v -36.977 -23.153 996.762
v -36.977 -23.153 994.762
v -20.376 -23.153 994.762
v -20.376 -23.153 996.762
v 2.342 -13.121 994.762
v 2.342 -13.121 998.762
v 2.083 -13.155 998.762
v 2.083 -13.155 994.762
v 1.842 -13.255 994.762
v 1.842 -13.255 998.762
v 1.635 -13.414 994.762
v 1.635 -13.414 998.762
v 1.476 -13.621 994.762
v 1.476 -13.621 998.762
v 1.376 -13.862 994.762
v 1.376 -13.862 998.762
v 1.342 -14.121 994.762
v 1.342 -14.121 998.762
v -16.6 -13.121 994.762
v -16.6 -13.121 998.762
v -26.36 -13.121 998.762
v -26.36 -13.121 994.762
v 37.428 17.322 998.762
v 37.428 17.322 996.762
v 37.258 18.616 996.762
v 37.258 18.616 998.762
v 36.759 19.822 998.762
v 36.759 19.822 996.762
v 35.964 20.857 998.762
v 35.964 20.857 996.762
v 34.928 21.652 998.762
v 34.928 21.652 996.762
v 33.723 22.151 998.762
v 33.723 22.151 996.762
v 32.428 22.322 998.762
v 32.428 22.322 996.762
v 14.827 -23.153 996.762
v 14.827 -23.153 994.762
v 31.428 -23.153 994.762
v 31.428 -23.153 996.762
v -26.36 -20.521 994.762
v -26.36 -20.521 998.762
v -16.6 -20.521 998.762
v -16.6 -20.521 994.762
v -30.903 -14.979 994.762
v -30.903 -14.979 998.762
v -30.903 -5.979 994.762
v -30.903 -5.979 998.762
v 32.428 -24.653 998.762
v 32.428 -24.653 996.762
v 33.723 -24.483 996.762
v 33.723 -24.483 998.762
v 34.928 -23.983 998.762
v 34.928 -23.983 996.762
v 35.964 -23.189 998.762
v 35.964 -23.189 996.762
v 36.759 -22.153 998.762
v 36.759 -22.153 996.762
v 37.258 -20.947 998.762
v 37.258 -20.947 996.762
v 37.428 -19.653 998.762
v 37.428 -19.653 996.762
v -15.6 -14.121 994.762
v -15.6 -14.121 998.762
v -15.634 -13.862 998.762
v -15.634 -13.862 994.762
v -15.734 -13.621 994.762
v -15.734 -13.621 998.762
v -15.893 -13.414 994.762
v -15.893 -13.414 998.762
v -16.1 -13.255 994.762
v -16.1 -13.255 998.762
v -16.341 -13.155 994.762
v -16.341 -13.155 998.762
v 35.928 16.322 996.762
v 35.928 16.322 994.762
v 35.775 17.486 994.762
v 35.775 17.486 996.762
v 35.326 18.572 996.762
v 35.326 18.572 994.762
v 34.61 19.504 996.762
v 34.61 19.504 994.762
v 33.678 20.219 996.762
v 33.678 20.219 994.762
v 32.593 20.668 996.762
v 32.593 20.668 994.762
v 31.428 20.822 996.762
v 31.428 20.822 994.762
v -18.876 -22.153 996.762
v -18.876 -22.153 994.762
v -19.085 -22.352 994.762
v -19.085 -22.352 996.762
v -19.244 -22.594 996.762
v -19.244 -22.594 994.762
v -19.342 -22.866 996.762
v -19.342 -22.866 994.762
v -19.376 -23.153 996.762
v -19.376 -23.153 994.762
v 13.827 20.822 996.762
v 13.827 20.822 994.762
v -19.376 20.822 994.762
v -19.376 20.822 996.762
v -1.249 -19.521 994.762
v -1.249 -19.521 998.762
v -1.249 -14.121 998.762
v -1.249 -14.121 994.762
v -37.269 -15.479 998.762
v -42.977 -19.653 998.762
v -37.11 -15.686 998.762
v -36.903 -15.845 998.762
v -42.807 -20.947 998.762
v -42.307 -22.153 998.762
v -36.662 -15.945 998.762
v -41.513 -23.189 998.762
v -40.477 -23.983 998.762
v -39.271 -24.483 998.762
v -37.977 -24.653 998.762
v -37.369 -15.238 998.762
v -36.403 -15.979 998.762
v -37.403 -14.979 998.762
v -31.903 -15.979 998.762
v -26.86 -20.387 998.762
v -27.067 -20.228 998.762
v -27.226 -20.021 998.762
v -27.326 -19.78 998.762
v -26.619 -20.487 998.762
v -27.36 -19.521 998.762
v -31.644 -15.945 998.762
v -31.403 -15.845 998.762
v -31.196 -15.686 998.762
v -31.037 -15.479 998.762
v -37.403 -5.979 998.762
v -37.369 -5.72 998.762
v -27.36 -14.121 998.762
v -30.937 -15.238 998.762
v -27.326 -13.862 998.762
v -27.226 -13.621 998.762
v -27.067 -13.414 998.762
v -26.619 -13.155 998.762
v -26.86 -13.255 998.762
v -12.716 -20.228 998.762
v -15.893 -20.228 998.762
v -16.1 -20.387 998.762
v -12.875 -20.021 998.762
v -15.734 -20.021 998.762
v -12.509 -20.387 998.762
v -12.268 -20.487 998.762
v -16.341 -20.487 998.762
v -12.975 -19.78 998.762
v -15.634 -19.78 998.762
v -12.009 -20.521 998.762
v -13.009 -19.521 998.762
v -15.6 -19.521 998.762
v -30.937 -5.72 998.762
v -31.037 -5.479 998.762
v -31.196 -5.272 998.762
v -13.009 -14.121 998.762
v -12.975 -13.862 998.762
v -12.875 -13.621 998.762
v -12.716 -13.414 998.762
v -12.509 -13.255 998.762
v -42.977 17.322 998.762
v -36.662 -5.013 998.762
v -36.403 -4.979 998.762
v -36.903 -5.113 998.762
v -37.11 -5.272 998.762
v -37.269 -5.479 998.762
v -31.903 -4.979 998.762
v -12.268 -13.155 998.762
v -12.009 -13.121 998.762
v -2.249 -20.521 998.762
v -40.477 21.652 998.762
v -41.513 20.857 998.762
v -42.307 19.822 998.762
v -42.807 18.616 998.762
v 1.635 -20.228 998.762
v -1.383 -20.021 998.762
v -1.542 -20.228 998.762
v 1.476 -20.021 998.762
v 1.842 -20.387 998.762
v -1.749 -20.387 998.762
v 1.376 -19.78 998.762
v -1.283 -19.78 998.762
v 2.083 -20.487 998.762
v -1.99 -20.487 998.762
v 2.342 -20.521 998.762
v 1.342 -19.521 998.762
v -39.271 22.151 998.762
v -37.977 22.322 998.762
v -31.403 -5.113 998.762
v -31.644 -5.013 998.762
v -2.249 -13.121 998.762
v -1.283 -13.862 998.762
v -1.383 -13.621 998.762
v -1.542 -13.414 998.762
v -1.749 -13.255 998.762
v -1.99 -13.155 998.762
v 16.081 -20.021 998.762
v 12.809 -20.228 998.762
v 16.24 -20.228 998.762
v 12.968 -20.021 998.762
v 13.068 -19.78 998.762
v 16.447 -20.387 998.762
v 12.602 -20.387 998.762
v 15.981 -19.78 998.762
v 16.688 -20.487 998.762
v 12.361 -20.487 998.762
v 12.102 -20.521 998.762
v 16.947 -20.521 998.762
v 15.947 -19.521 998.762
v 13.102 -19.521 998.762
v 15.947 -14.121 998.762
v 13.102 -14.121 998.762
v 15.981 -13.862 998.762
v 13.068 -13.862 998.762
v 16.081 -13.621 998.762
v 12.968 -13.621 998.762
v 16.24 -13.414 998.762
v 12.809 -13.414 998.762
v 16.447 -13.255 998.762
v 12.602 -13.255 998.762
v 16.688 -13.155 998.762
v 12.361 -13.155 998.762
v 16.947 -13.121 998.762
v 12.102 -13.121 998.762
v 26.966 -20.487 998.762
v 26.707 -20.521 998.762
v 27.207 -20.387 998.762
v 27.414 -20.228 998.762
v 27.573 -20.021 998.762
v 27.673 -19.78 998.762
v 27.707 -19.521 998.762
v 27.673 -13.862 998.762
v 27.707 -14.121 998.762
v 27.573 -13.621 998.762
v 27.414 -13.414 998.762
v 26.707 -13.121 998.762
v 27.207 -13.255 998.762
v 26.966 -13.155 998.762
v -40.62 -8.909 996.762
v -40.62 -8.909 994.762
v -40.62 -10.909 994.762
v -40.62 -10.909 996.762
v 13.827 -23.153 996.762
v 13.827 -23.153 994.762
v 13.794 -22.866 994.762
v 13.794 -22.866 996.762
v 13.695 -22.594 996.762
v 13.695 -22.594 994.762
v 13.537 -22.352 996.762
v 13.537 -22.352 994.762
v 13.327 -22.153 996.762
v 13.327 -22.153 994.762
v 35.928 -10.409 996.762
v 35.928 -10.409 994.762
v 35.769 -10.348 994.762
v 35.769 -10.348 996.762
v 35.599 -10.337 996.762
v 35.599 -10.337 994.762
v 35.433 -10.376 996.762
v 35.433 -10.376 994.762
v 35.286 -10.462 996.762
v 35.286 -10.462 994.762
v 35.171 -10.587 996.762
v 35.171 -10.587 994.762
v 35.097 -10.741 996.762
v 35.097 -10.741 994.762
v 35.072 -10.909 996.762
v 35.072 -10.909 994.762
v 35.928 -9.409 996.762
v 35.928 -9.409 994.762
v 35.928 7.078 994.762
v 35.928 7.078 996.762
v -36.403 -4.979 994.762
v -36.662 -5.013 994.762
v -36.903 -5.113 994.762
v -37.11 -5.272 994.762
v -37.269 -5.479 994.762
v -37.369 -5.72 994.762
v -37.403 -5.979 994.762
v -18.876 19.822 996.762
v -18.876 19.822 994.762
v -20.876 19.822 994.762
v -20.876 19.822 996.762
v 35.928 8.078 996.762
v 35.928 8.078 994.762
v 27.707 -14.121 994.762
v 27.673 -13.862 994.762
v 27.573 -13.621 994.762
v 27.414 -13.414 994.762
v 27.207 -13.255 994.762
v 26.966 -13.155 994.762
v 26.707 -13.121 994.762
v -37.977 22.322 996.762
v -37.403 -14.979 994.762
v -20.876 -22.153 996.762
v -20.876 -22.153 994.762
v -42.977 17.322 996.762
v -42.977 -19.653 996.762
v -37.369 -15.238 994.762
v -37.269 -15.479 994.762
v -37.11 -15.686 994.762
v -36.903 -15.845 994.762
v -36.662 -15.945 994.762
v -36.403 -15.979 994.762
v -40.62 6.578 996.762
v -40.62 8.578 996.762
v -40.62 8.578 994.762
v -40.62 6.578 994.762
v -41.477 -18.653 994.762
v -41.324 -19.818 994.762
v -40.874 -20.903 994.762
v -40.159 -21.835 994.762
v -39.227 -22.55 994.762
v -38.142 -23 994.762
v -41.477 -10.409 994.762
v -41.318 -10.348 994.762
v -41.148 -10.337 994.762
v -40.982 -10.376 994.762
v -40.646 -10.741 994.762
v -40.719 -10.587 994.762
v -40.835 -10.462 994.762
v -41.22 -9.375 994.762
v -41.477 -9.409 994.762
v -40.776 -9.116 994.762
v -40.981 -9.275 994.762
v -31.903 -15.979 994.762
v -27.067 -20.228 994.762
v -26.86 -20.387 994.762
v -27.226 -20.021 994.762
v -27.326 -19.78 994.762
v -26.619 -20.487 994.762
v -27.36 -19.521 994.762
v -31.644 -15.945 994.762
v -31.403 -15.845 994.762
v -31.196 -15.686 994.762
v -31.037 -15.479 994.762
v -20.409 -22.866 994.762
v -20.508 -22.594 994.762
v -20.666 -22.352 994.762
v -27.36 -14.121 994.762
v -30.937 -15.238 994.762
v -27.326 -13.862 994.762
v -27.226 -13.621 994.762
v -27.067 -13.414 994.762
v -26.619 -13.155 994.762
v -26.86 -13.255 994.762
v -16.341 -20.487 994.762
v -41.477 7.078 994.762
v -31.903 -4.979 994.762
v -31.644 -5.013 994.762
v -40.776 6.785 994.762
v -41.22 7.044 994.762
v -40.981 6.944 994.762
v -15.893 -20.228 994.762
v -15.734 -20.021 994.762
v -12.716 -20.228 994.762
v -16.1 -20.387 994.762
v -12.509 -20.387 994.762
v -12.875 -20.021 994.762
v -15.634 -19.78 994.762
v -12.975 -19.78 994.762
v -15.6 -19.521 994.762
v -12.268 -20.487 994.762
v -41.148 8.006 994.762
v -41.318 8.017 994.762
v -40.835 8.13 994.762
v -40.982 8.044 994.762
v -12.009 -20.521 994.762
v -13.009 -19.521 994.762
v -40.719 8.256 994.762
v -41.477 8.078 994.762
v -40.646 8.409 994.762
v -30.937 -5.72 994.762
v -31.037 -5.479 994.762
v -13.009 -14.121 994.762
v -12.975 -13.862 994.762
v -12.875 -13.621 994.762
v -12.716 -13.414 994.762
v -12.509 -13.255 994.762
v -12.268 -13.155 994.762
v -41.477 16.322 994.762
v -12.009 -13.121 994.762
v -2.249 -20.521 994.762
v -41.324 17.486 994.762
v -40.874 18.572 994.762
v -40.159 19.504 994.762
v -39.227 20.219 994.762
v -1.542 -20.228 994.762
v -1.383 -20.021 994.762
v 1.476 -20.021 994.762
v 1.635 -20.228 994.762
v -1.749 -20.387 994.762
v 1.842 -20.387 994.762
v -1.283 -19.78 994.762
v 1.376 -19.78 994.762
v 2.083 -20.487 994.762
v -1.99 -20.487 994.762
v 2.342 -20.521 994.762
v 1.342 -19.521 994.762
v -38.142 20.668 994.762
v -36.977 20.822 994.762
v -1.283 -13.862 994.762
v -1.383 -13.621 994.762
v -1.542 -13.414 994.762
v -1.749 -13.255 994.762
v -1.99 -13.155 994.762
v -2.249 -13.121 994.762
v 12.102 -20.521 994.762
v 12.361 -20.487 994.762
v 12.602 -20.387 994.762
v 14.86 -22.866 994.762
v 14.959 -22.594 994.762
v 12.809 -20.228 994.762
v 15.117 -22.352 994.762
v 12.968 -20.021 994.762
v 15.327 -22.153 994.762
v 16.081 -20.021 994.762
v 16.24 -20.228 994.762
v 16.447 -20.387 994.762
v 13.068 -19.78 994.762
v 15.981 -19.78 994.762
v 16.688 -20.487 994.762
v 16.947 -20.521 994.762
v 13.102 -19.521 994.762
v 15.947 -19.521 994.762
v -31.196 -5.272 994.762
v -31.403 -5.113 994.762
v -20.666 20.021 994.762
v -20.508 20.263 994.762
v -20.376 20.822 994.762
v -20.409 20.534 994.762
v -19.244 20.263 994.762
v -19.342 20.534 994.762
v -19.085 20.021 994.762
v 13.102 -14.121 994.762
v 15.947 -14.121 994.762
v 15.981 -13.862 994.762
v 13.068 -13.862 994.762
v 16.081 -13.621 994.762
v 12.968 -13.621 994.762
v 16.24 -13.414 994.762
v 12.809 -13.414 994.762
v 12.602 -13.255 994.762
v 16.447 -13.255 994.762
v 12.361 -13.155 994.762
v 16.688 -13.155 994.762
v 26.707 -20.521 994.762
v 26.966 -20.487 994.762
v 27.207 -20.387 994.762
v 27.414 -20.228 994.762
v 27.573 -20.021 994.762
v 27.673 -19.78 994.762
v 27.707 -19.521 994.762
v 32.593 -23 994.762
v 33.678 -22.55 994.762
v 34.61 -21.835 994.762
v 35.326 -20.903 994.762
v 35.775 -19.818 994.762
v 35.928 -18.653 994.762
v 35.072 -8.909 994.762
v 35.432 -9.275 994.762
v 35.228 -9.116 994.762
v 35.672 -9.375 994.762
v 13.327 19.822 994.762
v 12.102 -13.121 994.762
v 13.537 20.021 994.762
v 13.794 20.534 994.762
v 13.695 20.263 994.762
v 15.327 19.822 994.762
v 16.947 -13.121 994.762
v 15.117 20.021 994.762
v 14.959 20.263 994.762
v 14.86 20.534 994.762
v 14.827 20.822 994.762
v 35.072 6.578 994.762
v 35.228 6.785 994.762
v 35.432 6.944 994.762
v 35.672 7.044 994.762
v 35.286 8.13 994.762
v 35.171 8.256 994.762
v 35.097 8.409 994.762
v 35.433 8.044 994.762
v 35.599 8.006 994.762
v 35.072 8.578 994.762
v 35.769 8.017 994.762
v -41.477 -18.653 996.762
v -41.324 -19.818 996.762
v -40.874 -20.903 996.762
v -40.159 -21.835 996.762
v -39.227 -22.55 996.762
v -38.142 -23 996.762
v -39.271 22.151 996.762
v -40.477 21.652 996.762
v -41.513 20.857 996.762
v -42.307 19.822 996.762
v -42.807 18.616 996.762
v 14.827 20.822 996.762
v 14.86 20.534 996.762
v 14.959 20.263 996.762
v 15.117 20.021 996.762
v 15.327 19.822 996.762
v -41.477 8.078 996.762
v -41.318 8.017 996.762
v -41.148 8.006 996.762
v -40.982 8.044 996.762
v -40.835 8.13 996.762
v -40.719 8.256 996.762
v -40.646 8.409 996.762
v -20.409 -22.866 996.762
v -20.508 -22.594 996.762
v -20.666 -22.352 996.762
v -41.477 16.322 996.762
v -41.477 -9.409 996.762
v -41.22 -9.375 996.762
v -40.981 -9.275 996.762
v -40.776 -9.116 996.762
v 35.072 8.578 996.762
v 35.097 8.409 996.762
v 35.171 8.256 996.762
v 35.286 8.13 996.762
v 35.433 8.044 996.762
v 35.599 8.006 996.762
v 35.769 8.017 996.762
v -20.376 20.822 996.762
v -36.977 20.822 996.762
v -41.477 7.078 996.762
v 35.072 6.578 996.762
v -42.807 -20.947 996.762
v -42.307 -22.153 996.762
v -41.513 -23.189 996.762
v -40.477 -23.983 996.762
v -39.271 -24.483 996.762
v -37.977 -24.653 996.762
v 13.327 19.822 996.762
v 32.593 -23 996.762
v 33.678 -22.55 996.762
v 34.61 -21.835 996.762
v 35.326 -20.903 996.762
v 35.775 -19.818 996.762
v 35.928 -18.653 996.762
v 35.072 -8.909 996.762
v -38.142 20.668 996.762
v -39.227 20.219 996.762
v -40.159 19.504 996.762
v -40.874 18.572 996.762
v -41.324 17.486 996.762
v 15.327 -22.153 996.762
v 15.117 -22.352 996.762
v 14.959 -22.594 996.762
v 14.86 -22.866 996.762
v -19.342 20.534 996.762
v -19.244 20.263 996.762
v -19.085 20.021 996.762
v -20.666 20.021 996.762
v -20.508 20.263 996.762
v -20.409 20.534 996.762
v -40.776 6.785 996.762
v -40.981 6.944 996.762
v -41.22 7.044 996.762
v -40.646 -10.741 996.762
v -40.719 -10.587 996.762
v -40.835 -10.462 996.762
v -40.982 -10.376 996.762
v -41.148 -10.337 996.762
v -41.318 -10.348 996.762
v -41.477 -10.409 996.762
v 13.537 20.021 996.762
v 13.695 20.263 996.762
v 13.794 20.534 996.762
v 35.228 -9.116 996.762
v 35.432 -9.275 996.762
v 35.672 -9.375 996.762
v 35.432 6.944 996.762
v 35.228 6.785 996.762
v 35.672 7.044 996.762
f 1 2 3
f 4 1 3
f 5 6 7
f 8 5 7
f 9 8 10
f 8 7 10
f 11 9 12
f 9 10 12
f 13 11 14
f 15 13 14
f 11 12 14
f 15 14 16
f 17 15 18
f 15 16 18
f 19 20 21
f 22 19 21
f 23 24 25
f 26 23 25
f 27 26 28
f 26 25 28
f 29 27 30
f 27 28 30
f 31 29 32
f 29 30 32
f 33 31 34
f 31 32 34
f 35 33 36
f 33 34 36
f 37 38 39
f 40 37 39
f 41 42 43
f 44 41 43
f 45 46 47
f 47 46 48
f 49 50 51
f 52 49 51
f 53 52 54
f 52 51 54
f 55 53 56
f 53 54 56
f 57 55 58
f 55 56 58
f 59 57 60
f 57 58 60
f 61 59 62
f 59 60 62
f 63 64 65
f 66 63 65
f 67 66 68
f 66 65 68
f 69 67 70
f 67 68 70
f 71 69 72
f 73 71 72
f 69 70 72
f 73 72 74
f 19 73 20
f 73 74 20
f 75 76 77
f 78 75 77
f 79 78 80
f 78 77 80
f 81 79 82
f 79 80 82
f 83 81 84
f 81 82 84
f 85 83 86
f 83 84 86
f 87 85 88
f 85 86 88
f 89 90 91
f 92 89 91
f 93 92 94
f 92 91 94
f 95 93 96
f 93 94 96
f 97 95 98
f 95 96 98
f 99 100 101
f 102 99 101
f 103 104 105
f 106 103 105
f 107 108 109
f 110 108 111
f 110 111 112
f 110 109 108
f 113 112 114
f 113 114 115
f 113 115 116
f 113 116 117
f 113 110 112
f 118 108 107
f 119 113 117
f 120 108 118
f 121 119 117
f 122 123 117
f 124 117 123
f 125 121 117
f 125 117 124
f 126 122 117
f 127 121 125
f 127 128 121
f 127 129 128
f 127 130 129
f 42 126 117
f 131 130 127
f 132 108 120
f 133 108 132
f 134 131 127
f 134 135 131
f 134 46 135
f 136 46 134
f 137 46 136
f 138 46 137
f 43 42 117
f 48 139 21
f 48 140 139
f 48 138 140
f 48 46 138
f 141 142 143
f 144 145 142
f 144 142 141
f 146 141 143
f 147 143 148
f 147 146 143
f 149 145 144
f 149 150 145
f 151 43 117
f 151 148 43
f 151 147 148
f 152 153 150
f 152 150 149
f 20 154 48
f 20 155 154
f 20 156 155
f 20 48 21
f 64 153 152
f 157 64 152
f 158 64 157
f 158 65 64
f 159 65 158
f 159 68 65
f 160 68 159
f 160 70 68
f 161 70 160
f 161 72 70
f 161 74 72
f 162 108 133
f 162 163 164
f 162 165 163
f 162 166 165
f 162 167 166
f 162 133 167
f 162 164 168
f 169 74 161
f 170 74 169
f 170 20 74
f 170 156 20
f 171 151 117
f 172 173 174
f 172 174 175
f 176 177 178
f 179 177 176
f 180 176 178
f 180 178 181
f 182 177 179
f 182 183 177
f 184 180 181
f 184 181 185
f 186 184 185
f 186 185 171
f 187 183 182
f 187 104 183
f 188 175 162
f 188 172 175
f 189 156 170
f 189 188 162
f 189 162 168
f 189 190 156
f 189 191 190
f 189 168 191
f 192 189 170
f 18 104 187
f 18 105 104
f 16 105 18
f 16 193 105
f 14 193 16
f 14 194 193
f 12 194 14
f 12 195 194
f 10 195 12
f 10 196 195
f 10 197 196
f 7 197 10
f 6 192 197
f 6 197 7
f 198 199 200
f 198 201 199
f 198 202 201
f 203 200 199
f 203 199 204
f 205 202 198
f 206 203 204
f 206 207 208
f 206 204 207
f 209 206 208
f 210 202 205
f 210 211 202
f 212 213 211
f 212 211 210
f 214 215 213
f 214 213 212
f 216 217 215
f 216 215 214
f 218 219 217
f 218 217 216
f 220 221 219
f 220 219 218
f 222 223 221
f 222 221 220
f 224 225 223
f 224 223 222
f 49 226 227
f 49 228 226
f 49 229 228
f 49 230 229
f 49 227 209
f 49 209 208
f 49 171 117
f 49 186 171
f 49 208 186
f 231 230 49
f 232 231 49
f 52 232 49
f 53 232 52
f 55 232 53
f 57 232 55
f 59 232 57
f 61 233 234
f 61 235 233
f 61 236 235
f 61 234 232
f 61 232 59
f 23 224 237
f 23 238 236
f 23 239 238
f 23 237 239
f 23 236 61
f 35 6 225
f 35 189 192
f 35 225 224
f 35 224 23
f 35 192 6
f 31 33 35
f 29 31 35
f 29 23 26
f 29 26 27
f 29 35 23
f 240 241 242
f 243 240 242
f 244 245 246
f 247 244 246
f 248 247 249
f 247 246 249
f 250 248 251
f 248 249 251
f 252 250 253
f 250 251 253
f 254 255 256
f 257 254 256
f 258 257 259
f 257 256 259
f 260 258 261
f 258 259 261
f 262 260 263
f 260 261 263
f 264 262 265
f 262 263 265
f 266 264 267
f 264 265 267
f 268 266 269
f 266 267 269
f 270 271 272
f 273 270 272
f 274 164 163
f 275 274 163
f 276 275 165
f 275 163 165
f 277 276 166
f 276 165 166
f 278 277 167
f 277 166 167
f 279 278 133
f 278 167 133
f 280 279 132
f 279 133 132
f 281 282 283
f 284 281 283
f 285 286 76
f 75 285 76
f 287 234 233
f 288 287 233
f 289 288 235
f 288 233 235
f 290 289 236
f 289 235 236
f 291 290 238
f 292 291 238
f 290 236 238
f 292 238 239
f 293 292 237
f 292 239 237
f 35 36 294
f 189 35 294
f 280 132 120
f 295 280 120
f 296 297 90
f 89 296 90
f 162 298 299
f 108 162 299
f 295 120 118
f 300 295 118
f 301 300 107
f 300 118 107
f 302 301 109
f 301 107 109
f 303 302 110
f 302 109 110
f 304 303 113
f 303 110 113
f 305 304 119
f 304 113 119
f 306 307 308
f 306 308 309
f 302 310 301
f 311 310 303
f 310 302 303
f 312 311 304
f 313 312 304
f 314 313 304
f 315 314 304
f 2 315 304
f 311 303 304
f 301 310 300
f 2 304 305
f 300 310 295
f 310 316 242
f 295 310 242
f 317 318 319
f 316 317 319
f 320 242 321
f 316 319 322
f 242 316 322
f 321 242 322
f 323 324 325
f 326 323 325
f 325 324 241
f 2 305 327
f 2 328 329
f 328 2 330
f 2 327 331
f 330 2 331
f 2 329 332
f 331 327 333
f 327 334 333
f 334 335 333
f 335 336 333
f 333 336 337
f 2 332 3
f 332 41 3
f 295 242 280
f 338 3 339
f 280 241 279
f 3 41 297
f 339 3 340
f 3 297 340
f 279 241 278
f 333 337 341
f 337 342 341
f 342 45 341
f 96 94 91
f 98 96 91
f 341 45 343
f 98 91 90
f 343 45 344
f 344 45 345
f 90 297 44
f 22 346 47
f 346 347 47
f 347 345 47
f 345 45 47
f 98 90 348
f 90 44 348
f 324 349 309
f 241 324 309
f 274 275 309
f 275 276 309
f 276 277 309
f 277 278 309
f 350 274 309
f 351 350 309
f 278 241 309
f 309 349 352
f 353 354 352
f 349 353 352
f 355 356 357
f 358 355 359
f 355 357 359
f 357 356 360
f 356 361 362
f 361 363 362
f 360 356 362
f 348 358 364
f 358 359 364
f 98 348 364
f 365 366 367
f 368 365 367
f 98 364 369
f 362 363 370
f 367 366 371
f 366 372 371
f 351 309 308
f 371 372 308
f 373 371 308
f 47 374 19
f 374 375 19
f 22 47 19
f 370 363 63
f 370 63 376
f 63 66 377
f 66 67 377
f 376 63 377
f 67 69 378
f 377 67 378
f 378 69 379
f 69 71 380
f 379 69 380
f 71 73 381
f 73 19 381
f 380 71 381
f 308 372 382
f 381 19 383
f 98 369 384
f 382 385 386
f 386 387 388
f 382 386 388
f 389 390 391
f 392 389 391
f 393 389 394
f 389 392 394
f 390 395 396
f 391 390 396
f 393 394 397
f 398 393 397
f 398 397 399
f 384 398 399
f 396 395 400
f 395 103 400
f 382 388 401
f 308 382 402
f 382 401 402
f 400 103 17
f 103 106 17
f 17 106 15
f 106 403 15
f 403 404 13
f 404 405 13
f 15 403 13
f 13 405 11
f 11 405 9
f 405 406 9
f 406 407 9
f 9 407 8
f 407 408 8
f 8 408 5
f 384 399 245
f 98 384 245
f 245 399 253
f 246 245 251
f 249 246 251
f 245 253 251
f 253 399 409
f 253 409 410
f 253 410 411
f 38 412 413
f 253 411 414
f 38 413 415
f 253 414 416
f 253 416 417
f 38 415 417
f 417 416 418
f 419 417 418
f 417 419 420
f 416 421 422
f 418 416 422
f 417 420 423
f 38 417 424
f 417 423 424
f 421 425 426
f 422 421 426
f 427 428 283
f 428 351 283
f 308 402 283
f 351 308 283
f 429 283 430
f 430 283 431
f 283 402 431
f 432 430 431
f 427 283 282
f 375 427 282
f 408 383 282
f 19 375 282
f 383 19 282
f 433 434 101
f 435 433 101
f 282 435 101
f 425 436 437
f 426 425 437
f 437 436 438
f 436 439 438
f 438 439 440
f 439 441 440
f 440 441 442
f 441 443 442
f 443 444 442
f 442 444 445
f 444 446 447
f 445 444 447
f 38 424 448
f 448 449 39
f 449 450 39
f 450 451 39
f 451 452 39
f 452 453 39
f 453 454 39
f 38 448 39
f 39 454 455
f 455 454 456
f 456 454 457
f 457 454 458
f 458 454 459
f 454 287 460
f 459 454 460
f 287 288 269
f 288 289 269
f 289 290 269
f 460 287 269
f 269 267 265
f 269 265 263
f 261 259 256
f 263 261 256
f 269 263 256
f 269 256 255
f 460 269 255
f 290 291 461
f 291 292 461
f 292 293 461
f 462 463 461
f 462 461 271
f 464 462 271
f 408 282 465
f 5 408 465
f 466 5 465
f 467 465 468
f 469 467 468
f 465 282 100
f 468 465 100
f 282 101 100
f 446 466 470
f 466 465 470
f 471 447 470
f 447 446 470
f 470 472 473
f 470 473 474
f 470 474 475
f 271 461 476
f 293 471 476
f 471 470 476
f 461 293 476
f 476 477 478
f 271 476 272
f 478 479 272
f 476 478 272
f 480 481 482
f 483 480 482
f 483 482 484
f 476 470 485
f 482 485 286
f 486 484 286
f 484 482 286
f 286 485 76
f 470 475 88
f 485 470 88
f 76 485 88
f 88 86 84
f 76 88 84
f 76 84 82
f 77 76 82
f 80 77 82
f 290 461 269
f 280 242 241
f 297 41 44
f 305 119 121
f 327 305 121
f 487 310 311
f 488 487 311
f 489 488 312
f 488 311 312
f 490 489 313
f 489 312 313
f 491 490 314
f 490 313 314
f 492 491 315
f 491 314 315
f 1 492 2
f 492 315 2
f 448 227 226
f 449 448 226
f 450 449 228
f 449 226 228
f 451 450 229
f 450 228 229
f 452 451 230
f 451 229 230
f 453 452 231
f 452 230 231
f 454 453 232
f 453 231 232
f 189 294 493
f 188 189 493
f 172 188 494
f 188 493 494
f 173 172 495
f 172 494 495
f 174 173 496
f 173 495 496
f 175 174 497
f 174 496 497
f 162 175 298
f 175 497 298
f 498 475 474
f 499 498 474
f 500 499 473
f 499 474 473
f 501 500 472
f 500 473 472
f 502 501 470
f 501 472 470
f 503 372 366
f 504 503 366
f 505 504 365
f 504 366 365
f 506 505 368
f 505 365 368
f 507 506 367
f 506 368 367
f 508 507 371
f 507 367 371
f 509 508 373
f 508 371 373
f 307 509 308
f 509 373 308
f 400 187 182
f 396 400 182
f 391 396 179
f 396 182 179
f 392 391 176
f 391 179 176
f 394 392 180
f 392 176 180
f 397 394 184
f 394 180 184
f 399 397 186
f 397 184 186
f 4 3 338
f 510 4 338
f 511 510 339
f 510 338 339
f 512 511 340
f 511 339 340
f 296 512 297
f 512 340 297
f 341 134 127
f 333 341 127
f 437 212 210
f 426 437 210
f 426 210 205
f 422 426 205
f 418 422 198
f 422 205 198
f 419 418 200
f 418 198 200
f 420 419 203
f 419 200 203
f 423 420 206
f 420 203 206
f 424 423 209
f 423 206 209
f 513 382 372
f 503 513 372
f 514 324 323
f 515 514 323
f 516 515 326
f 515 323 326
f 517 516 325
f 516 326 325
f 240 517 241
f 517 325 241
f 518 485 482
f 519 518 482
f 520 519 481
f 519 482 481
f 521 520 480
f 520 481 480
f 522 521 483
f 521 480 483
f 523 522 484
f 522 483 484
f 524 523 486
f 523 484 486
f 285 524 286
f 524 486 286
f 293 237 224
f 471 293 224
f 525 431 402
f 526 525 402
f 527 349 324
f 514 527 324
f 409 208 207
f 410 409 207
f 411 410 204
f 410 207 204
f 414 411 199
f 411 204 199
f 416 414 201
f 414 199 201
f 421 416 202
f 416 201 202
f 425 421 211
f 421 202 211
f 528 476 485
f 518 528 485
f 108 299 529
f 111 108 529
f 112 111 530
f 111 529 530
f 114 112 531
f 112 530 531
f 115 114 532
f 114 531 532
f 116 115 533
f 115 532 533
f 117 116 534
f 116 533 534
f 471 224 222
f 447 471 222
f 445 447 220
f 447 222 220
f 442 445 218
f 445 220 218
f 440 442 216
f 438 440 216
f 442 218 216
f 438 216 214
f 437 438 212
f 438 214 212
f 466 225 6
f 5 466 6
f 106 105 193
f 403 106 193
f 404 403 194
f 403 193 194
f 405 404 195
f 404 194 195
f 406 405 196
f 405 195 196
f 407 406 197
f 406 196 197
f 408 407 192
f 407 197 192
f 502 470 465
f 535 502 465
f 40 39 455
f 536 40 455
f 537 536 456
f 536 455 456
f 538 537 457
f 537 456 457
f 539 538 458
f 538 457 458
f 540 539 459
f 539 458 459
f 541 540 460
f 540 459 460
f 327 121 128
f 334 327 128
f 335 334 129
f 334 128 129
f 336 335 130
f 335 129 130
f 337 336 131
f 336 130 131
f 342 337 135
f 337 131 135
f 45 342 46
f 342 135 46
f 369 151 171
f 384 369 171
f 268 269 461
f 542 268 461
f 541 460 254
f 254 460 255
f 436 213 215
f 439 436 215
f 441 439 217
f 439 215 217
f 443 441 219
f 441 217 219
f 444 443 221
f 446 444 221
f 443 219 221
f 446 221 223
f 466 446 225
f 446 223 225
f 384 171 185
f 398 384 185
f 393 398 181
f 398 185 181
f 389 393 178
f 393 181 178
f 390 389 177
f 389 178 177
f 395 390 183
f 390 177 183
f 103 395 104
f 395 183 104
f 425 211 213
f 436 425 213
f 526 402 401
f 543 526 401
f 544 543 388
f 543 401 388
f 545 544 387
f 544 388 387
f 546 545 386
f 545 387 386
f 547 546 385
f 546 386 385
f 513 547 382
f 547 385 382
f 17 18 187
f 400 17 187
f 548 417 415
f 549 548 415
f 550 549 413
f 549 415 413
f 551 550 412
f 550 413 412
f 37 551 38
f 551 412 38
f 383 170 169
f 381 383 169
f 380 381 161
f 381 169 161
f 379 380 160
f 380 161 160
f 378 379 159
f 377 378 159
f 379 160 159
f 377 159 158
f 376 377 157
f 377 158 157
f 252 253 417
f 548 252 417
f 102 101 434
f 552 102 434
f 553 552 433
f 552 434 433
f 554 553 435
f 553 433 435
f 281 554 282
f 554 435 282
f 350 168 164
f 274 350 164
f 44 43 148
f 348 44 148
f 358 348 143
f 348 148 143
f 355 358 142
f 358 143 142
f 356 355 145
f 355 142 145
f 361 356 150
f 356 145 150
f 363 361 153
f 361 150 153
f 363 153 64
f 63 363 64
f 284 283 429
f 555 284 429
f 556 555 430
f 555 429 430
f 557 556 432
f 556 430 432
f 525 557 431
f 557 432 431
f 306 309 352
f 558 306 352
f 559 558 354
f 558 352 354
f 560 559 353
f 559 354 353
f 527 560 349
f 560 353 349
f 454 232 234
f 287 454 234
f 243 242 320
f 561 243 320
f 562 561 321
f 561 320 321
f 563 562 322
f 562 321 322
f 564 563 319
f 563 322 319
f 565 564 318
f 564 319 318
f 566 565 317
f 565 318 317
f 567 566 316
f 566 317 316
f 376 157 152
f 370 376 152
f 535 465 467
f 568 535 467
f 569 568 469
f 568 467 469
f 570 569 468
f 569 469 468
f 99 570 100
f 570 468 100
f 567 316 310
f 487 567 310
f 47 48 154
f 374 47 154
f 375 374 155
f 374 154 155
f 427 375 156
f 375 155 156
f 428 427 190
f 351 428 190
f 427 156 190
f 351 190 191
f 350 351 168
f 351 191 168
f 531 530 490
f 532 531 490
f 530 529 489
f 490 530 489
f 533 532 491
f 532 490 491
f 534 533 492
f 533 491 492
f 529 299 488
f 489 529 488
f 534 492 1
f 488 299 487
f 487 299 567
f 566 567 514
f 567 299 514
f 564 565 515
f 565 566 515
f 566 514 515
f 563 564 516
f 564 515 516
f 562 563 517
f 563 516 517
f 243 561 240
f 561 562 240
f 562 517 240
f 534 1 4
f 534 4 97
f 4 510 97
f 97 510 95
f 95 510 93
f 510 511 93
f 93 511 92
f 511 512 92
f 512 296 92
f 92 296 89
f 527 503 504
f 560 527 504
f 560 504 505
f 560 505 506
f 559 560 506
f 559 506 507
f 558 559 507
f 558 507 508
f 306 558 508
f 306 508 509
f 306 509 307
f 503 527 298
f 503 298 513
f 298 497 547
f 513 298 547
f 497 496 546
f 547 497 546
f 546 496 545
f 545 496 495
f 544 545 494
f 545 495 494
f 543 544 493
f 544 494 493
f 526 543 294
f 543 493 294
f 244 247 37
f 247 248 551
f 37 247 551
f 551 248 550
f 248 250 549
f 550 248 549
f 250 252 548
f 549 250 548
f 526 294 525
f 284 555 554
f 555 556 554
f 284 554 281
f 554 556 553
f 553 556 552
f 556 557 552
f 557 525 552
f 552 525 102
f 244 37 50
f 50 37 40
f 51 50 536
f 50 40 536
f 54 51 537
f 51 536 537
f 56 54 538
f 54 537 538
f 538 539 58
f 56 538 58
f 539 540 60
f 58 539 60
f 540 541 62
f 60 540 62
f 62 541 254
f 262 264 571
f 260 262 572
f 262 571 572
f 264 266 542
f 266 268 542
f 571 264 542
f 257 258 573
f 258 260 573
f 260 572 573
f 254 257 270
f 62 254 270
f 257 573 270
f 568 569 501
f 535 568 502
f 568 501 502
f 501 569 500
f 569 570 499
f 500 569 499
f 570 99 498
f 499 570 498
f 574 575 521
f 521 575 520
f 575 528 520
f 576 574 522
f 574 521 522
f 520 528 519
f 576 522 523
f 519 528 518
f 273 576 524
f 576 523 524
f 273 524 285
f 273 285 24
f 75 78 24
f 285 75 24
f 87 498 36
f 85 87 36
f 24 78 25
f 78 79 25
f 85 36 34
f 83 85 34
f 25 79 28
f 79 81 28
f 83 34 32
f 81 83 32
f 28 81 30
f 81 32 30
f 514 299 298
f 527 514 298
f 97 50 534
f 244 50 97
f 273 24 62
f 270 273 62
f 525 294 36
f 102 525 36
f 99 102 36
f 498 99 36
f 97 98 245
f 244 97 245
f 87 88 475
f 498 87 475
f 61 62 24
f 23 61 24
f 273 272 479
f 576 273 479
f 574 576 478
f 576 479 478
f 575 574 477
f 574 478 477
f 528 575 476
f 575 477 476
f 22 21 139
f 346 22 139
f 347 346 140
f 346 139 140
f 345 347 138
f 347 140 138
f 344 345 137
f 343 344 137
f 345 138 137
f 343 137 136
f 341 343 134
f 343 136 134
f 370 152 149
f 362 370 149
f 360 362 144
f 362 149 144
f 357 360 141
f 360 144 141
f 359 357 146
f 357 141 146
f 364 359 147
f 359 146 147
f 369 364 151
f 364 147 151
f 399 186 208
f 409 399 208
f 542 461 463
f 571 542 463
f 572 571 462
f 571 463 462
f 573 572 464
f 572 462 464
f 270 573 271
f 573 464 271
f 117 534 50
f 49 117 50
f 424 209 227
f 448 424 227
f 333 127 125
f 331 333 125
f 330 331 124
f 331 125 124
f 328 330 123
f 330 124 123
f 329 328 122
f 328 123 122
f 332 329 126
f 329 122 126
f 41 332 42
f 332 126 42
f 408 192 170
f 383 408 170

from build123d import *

# Parameters (mm, degrees)
EXTRUDE_1_DEPTH     = 2
EXTRUDE_2_DEPTH     = 2
CUT_EXTRUDE_1_DEPTH = 5


with BuildPart() as part:
    # 草图1 → 凸台-拉伸1 (new body)
    with BuildSketch(Plane.XY.offset(994.761746566)):
        with BuildLine():
            Line((-36.977217365, -23.153037779), (-20.375793692, -23.153037779))
            ThreePointArc((-20.375793692, -23.153037779), (-20.507759703, -22.594020785), (-20.875793692, -22.153037779))
            Line((-20.875793692, -22.153037779), (-18.875793692, -22.153037779))
            ThreePointArc((-18.875793692, -22.153037779), (-19.243827681, -22.594020785), (-19.375793692, -23.153037779))
            Line((-19.375793692, -23.153037779), (13.827053654, -23.153037779))
            ThreePointArc((13.827053654, -23.153037779), (13.695087643, -22.594020785), (13.327053654, -22.153037779))
            Line((13.327053654, -22.153037779), (15.327053654, -22.153037779))
            ThreePointArc((15.327053654, -22.153037779), (14.959019666, -22.594020785), (14.827053654, -23.153037779))
            Line((14.827053654, -23.153037779), (31.428477328, -23.153037779))
            ThreePointArc((31.428477328, -23.153037779), (34.610457843, -21.835018294), (35.928477328, -18.653037779))
            Line((35.928477328, -18.653037779), (35.928477328, -10.409369377))
            ThreePointArc((35.928477328, -10.409369377), (35.356461327, -10.413320038), (35.071587729, -10.909369377))
            Line((35.071587729, -10.909369377), (35.071587729, -8.909369377))
            ThreePointArc((35.071587729, -8.909369377), (35.432427989, -9.275228629), (35.928477328, -9.409369377))
            Line((35.928477328, -9.409369377), (35.928477328, 7.077967428))
            ThreePointArc((35.928477328, 7.077967428), (35.432427989, 6.943826681), (35.071587729, 6.577967428))
            Line((35.071587729, 6.577967428), (35.071587729, 8.577967428))
            ThreePointArc((35.071587729, 8.577967428), (35.356461327, 8.08191809), (35.928477328, 8.077967428))
            Line((35.928477328, 8.077967428), (35.928477328, 16.32163583))
            ThreePointArc((35.928477328, 16.32163583), (34.610457843, 19.503616346), (31.428477328, 20.82163583))
            Line((31.428477328, 20.82163583), (14.827053654, 20.82163583))
            ThreePointArc((14.827053654, 20.82163583), (14.959019666, 20.262618836), (15.327053654, 19.82163583))
            Line((15.327053654, 19.82163583), (13.327053654, 19.82163583))
            ThreePointArc((13.327053654, 19.82163583), (13.695087643, 20.262618836), (13.827053654, 20.82163583))
            Line((13.827053654, 20.82163583), (-19.375793692, 20.82163583))
            ThreePointArc((-19.375793692, 20.82163583), (-19.243827681, 20.262618836), (-18.875793692, 19.82163583))
            Line((-18.875793692, 19.82163583), (-20.875793692, 19.82163583))
            ThreePointArc((-20.875793692, 19.82163583), (-20.507759703, 20.262618836), (-20.375793692, 20.82163583))
            Line((-20.375793692, 20.82163583), (-36.977217365, 20.82163583))
            ThreePointArc((-36.977217365, 20.82163583), (-40.15919788, 19.503616346), (-41.477217365, 16.32163583))
            Line((-41.477217365, 16.32163583), (-41.477217365, 8.077967428))
            ThreePointArc((-41.477217365, 8.077967428), (-40.905201365, 8.08191809), (-40.620327767, 8.577967428))
            Line((-40.620327767, 8.577967428), (-40.620327767, 6.577967428))
            ThreePointArc((-40.620327767, 6.577967428), (-40.981168027, 6.943826681), (-41.477217365, 7.077967428))
            Line((-41.477217365, 7.077967428), (-41.477217365, -9.409369377))
            ThreePointArc((-41.477217365, -9.409369377), (-40.981168027, -9.275228629), (-40.620327767, -8.909369377))
            Line((-40.620327767, -8.909369377), (-40.620327767, -10.909369377))
            ThreePointArc((-40.620327767, -10.909369377), (-40.905201365, -10.413320038), (-41.477217365, -10.409369377))
            Line((-41.477217365, -10.409369377), (-41.477217365, -18.653037779))
            ThreePointArc((-41.477217365, -18.653037779), (-40.15919788, -21.835018294), (-36.977217365, -23.153037779))
        make_face()
    extrude(amount=EXTRUDE_1_DEPTH)

    # 草图2 → 凸台-拉伸2 (add)
    with BuildSketch(Plane.XY.offset(996.761746566)):
        with BuildLine():
            Line((-42.977217365, 17.32163583), (-42.977217365, -19.653037779))
            ThreePointArc((-42.977217365, -19.653037779), (-41.512751271, -23.188571685), (-37.977217365, -24.653037779))
            Line((-37.977217365, -24.653037779), (32.428477328, -24.653037779))
            ThreePointArc((32.428477328, -24.653037779), (35.964011233, -23.188571685), (37.428477328, -19.653037779))
            Line((37.428477328, -19.653037779), (37.428477328, 17.32163583))
            ThreePointArc((37.428477328, 17.32163583), (35.964011233, 20.857169736), (32.428477328, 22.32163583))
            Line((32.428477328, 22.32163583), (-37.977217365, 22.32163583))
            ThreePointArc((-37.977217365, 22.32163583), (-41.512751271, 20.857169736), (-42.977217365, 17.32163583))
        make_face()
    extrude(amount=EXTRUDE_2_DEPTH)

    # 草图3 → 切除-拉伸1 (cut)
    with BuildSketch(Plane.XY.offset(998.761746566)):
        with BuildLine():
            Line((-24.489796203, -20.520829455), (-18.469872403, -20.520829455))
            Line((-18.469872403, -20.520829455), (-16.599885103, -20.520829455))
            ThreePointArc((-16.599885103, -20.520829455), (-15.892778322, -20.227936236), (-15.599885103, -19.520829455))
            Line((-15.599885103, -19.520829455), (-15.599885103, -14.120887455))
            ThreePointArc((-15.599885103, -14.120887455), (-15.892778322, -13.413780673), (-16.599885103, -13.120887455))
            Line((-16.599885103, -13.120887455), (-26.359783503, -13.120887455))
            ThreePointArc((-26.359783503, -13.120887455), (-27.066890284, -13.413780673), (-27.359783503, -14.120887455))
            Line((-27.359783503, -14.120887455), (-27.359783503, -19.520829455))
            ThreePointArc((-27.359783503, -19.520829455), (-27.066890284, -20.227936236), (-26.359783503, -20.520829455))
            Line((-26.359783503, -20.520829455), (-24.489796203, -20.520829455))
        make_face()
        with BuildLine():
            Line((-10.138767501, -20.520829455), (-4.118843701, -20.520829455))
            Line((-4.118843701, -20.520829455), (-2.248856401, -20.520829455))
            ThreePointArc((-2.248856401, -20.520829455), (-1.54174962, -20.227936236), (-1.248856401, -19.520829455))
            Line((-1.248856401, -19.520829455), (-1.248856401, -14.120887455))
            ThreePointArc((-1.248856401, -14.120887455), (-1.54174962, -13.413780673), (-2.248856401, -13.120887455))
            Line((-2.248856401, -13.120887455), (-12.008754801, -13.120887455))
            ThreePointArc((-12.008754801, -13.120887455), (-12.715861582, -13.413780673), (-13.008754801, -14.120887455))
            Line((-13.008754801, -14.120887455), (-13.008754801, -19.520829455))
            ThreePointArc((-13.008754801, -19.520829455), (-12.715861582, -20.227936236), (-12.008754801, -20.520829455))
            Line((-12.008754801, -20.520829455), (-10.138767501, -20.520829455))
        make_face()
        with BuildLine():
            Line((4.212261201, -20.520829455), (10.232185001, -20.520829455))
            Line((10.232185001, -20.520829455), (12.102172301, -20.520829455))
            ThreePointArc((12.102172301, -20.520829455), (12.809279082, -20.227936236), (13.102172301, -19.520829455))
            Line((13.102172301, -19.520829455), (13.102172301, -14.120887455))
            ThreePointArc((13.102172301, -14.120887455), (12.809279082, -13.413780673), (12.102172301, -13.120887455))
            Line((12.102172301, -13.120887455), (2.342273901, -13.120887455))
            ThreePointArc((2.342273901, -13.120887455), (1.63516712, -13.413780673), (1.342273901, -14.120887455))
            Line((1.342273901, -14.120887455), (1.342273901, -19.520829455))
            ThreePointArc((1.342273901, -19.520829455), (1.63516712, -20.227936236), (2.342273901, -20.520829455))
            Line((2.342273901, -20.520829455), (4.212261201, -20.520829455))
        make_face()
        with BuildLine():
            Line((18.817290411, -20.520829455), (24.837214211, -20.520829455))
            Line((24.837214211, -20.520829455), (26.707201511, -20.520829455))
            ThreePointArc((26.707201511, -20.520829455), (27.414308292, -20.227936236), (27.707201511, -19.520829455))
            Line((27.707201511, -19.520829455), (27.707201511, -14.120887455))
            ThreePointArc((27.707201511, -14.120887455), (27.414308292, -13.413780673), (26.707201511, -13.120887455))
            Line((26.707201511, -13.120887455), (16.947303111, -13.120887455))
            ThreePointArc((16.947303111, -13.120887455), (16.24019633, -13.413780673), (15.947303111, -14.120887455))
            Line((15.947303111, -14.120887455), (15.947303111, -19.520829455))
            ThreePointArc((15.947303111, -19.520829455), (16.24019633, -20.227936236), (16.947303111, -20.520829455))
            Line((16.947303111, -20.520829455), (18.817290411, -20.520829455))
        make_face()
        with BuildLine():
            Line((-37.402959537, -5.978719817), (-37.402959537, -14.978719817))
            ThreePointArc((-37.402959537, -14.978719817), (-37.110066318, -15.685826598), (-36.402959537, -15.978719817))
            Line((-36.402959537, -15.978719817), (-31.902959537, -15.978719817))
            ThreePointArc((-31.902959537, -15.978719817), (-31.195852756, -15.685826598), (-30.902959537, -14.978719817))
            Line((-30.902959537, -14.978719817), (-30.902959537, -5.978719817))
            ThreePointArc((-30.902959537, -5.978719817), (-31.195852756, -5.271613035), (-31.902959537, -4.978719817))
            Line((-31.902959537, -4.978719817), (-36.402959537, -4.978719817))
            ThreePointArc((-36.402959537, -4.978719817), (-37.110066318, -5.271613035), (-37.402959537, -5.978719817))
        make_face()
    extrude(amount=-CUT_EXTRUDE_1_DEPTH, mode=Mode.SUBTRACT)


solid = part.part
